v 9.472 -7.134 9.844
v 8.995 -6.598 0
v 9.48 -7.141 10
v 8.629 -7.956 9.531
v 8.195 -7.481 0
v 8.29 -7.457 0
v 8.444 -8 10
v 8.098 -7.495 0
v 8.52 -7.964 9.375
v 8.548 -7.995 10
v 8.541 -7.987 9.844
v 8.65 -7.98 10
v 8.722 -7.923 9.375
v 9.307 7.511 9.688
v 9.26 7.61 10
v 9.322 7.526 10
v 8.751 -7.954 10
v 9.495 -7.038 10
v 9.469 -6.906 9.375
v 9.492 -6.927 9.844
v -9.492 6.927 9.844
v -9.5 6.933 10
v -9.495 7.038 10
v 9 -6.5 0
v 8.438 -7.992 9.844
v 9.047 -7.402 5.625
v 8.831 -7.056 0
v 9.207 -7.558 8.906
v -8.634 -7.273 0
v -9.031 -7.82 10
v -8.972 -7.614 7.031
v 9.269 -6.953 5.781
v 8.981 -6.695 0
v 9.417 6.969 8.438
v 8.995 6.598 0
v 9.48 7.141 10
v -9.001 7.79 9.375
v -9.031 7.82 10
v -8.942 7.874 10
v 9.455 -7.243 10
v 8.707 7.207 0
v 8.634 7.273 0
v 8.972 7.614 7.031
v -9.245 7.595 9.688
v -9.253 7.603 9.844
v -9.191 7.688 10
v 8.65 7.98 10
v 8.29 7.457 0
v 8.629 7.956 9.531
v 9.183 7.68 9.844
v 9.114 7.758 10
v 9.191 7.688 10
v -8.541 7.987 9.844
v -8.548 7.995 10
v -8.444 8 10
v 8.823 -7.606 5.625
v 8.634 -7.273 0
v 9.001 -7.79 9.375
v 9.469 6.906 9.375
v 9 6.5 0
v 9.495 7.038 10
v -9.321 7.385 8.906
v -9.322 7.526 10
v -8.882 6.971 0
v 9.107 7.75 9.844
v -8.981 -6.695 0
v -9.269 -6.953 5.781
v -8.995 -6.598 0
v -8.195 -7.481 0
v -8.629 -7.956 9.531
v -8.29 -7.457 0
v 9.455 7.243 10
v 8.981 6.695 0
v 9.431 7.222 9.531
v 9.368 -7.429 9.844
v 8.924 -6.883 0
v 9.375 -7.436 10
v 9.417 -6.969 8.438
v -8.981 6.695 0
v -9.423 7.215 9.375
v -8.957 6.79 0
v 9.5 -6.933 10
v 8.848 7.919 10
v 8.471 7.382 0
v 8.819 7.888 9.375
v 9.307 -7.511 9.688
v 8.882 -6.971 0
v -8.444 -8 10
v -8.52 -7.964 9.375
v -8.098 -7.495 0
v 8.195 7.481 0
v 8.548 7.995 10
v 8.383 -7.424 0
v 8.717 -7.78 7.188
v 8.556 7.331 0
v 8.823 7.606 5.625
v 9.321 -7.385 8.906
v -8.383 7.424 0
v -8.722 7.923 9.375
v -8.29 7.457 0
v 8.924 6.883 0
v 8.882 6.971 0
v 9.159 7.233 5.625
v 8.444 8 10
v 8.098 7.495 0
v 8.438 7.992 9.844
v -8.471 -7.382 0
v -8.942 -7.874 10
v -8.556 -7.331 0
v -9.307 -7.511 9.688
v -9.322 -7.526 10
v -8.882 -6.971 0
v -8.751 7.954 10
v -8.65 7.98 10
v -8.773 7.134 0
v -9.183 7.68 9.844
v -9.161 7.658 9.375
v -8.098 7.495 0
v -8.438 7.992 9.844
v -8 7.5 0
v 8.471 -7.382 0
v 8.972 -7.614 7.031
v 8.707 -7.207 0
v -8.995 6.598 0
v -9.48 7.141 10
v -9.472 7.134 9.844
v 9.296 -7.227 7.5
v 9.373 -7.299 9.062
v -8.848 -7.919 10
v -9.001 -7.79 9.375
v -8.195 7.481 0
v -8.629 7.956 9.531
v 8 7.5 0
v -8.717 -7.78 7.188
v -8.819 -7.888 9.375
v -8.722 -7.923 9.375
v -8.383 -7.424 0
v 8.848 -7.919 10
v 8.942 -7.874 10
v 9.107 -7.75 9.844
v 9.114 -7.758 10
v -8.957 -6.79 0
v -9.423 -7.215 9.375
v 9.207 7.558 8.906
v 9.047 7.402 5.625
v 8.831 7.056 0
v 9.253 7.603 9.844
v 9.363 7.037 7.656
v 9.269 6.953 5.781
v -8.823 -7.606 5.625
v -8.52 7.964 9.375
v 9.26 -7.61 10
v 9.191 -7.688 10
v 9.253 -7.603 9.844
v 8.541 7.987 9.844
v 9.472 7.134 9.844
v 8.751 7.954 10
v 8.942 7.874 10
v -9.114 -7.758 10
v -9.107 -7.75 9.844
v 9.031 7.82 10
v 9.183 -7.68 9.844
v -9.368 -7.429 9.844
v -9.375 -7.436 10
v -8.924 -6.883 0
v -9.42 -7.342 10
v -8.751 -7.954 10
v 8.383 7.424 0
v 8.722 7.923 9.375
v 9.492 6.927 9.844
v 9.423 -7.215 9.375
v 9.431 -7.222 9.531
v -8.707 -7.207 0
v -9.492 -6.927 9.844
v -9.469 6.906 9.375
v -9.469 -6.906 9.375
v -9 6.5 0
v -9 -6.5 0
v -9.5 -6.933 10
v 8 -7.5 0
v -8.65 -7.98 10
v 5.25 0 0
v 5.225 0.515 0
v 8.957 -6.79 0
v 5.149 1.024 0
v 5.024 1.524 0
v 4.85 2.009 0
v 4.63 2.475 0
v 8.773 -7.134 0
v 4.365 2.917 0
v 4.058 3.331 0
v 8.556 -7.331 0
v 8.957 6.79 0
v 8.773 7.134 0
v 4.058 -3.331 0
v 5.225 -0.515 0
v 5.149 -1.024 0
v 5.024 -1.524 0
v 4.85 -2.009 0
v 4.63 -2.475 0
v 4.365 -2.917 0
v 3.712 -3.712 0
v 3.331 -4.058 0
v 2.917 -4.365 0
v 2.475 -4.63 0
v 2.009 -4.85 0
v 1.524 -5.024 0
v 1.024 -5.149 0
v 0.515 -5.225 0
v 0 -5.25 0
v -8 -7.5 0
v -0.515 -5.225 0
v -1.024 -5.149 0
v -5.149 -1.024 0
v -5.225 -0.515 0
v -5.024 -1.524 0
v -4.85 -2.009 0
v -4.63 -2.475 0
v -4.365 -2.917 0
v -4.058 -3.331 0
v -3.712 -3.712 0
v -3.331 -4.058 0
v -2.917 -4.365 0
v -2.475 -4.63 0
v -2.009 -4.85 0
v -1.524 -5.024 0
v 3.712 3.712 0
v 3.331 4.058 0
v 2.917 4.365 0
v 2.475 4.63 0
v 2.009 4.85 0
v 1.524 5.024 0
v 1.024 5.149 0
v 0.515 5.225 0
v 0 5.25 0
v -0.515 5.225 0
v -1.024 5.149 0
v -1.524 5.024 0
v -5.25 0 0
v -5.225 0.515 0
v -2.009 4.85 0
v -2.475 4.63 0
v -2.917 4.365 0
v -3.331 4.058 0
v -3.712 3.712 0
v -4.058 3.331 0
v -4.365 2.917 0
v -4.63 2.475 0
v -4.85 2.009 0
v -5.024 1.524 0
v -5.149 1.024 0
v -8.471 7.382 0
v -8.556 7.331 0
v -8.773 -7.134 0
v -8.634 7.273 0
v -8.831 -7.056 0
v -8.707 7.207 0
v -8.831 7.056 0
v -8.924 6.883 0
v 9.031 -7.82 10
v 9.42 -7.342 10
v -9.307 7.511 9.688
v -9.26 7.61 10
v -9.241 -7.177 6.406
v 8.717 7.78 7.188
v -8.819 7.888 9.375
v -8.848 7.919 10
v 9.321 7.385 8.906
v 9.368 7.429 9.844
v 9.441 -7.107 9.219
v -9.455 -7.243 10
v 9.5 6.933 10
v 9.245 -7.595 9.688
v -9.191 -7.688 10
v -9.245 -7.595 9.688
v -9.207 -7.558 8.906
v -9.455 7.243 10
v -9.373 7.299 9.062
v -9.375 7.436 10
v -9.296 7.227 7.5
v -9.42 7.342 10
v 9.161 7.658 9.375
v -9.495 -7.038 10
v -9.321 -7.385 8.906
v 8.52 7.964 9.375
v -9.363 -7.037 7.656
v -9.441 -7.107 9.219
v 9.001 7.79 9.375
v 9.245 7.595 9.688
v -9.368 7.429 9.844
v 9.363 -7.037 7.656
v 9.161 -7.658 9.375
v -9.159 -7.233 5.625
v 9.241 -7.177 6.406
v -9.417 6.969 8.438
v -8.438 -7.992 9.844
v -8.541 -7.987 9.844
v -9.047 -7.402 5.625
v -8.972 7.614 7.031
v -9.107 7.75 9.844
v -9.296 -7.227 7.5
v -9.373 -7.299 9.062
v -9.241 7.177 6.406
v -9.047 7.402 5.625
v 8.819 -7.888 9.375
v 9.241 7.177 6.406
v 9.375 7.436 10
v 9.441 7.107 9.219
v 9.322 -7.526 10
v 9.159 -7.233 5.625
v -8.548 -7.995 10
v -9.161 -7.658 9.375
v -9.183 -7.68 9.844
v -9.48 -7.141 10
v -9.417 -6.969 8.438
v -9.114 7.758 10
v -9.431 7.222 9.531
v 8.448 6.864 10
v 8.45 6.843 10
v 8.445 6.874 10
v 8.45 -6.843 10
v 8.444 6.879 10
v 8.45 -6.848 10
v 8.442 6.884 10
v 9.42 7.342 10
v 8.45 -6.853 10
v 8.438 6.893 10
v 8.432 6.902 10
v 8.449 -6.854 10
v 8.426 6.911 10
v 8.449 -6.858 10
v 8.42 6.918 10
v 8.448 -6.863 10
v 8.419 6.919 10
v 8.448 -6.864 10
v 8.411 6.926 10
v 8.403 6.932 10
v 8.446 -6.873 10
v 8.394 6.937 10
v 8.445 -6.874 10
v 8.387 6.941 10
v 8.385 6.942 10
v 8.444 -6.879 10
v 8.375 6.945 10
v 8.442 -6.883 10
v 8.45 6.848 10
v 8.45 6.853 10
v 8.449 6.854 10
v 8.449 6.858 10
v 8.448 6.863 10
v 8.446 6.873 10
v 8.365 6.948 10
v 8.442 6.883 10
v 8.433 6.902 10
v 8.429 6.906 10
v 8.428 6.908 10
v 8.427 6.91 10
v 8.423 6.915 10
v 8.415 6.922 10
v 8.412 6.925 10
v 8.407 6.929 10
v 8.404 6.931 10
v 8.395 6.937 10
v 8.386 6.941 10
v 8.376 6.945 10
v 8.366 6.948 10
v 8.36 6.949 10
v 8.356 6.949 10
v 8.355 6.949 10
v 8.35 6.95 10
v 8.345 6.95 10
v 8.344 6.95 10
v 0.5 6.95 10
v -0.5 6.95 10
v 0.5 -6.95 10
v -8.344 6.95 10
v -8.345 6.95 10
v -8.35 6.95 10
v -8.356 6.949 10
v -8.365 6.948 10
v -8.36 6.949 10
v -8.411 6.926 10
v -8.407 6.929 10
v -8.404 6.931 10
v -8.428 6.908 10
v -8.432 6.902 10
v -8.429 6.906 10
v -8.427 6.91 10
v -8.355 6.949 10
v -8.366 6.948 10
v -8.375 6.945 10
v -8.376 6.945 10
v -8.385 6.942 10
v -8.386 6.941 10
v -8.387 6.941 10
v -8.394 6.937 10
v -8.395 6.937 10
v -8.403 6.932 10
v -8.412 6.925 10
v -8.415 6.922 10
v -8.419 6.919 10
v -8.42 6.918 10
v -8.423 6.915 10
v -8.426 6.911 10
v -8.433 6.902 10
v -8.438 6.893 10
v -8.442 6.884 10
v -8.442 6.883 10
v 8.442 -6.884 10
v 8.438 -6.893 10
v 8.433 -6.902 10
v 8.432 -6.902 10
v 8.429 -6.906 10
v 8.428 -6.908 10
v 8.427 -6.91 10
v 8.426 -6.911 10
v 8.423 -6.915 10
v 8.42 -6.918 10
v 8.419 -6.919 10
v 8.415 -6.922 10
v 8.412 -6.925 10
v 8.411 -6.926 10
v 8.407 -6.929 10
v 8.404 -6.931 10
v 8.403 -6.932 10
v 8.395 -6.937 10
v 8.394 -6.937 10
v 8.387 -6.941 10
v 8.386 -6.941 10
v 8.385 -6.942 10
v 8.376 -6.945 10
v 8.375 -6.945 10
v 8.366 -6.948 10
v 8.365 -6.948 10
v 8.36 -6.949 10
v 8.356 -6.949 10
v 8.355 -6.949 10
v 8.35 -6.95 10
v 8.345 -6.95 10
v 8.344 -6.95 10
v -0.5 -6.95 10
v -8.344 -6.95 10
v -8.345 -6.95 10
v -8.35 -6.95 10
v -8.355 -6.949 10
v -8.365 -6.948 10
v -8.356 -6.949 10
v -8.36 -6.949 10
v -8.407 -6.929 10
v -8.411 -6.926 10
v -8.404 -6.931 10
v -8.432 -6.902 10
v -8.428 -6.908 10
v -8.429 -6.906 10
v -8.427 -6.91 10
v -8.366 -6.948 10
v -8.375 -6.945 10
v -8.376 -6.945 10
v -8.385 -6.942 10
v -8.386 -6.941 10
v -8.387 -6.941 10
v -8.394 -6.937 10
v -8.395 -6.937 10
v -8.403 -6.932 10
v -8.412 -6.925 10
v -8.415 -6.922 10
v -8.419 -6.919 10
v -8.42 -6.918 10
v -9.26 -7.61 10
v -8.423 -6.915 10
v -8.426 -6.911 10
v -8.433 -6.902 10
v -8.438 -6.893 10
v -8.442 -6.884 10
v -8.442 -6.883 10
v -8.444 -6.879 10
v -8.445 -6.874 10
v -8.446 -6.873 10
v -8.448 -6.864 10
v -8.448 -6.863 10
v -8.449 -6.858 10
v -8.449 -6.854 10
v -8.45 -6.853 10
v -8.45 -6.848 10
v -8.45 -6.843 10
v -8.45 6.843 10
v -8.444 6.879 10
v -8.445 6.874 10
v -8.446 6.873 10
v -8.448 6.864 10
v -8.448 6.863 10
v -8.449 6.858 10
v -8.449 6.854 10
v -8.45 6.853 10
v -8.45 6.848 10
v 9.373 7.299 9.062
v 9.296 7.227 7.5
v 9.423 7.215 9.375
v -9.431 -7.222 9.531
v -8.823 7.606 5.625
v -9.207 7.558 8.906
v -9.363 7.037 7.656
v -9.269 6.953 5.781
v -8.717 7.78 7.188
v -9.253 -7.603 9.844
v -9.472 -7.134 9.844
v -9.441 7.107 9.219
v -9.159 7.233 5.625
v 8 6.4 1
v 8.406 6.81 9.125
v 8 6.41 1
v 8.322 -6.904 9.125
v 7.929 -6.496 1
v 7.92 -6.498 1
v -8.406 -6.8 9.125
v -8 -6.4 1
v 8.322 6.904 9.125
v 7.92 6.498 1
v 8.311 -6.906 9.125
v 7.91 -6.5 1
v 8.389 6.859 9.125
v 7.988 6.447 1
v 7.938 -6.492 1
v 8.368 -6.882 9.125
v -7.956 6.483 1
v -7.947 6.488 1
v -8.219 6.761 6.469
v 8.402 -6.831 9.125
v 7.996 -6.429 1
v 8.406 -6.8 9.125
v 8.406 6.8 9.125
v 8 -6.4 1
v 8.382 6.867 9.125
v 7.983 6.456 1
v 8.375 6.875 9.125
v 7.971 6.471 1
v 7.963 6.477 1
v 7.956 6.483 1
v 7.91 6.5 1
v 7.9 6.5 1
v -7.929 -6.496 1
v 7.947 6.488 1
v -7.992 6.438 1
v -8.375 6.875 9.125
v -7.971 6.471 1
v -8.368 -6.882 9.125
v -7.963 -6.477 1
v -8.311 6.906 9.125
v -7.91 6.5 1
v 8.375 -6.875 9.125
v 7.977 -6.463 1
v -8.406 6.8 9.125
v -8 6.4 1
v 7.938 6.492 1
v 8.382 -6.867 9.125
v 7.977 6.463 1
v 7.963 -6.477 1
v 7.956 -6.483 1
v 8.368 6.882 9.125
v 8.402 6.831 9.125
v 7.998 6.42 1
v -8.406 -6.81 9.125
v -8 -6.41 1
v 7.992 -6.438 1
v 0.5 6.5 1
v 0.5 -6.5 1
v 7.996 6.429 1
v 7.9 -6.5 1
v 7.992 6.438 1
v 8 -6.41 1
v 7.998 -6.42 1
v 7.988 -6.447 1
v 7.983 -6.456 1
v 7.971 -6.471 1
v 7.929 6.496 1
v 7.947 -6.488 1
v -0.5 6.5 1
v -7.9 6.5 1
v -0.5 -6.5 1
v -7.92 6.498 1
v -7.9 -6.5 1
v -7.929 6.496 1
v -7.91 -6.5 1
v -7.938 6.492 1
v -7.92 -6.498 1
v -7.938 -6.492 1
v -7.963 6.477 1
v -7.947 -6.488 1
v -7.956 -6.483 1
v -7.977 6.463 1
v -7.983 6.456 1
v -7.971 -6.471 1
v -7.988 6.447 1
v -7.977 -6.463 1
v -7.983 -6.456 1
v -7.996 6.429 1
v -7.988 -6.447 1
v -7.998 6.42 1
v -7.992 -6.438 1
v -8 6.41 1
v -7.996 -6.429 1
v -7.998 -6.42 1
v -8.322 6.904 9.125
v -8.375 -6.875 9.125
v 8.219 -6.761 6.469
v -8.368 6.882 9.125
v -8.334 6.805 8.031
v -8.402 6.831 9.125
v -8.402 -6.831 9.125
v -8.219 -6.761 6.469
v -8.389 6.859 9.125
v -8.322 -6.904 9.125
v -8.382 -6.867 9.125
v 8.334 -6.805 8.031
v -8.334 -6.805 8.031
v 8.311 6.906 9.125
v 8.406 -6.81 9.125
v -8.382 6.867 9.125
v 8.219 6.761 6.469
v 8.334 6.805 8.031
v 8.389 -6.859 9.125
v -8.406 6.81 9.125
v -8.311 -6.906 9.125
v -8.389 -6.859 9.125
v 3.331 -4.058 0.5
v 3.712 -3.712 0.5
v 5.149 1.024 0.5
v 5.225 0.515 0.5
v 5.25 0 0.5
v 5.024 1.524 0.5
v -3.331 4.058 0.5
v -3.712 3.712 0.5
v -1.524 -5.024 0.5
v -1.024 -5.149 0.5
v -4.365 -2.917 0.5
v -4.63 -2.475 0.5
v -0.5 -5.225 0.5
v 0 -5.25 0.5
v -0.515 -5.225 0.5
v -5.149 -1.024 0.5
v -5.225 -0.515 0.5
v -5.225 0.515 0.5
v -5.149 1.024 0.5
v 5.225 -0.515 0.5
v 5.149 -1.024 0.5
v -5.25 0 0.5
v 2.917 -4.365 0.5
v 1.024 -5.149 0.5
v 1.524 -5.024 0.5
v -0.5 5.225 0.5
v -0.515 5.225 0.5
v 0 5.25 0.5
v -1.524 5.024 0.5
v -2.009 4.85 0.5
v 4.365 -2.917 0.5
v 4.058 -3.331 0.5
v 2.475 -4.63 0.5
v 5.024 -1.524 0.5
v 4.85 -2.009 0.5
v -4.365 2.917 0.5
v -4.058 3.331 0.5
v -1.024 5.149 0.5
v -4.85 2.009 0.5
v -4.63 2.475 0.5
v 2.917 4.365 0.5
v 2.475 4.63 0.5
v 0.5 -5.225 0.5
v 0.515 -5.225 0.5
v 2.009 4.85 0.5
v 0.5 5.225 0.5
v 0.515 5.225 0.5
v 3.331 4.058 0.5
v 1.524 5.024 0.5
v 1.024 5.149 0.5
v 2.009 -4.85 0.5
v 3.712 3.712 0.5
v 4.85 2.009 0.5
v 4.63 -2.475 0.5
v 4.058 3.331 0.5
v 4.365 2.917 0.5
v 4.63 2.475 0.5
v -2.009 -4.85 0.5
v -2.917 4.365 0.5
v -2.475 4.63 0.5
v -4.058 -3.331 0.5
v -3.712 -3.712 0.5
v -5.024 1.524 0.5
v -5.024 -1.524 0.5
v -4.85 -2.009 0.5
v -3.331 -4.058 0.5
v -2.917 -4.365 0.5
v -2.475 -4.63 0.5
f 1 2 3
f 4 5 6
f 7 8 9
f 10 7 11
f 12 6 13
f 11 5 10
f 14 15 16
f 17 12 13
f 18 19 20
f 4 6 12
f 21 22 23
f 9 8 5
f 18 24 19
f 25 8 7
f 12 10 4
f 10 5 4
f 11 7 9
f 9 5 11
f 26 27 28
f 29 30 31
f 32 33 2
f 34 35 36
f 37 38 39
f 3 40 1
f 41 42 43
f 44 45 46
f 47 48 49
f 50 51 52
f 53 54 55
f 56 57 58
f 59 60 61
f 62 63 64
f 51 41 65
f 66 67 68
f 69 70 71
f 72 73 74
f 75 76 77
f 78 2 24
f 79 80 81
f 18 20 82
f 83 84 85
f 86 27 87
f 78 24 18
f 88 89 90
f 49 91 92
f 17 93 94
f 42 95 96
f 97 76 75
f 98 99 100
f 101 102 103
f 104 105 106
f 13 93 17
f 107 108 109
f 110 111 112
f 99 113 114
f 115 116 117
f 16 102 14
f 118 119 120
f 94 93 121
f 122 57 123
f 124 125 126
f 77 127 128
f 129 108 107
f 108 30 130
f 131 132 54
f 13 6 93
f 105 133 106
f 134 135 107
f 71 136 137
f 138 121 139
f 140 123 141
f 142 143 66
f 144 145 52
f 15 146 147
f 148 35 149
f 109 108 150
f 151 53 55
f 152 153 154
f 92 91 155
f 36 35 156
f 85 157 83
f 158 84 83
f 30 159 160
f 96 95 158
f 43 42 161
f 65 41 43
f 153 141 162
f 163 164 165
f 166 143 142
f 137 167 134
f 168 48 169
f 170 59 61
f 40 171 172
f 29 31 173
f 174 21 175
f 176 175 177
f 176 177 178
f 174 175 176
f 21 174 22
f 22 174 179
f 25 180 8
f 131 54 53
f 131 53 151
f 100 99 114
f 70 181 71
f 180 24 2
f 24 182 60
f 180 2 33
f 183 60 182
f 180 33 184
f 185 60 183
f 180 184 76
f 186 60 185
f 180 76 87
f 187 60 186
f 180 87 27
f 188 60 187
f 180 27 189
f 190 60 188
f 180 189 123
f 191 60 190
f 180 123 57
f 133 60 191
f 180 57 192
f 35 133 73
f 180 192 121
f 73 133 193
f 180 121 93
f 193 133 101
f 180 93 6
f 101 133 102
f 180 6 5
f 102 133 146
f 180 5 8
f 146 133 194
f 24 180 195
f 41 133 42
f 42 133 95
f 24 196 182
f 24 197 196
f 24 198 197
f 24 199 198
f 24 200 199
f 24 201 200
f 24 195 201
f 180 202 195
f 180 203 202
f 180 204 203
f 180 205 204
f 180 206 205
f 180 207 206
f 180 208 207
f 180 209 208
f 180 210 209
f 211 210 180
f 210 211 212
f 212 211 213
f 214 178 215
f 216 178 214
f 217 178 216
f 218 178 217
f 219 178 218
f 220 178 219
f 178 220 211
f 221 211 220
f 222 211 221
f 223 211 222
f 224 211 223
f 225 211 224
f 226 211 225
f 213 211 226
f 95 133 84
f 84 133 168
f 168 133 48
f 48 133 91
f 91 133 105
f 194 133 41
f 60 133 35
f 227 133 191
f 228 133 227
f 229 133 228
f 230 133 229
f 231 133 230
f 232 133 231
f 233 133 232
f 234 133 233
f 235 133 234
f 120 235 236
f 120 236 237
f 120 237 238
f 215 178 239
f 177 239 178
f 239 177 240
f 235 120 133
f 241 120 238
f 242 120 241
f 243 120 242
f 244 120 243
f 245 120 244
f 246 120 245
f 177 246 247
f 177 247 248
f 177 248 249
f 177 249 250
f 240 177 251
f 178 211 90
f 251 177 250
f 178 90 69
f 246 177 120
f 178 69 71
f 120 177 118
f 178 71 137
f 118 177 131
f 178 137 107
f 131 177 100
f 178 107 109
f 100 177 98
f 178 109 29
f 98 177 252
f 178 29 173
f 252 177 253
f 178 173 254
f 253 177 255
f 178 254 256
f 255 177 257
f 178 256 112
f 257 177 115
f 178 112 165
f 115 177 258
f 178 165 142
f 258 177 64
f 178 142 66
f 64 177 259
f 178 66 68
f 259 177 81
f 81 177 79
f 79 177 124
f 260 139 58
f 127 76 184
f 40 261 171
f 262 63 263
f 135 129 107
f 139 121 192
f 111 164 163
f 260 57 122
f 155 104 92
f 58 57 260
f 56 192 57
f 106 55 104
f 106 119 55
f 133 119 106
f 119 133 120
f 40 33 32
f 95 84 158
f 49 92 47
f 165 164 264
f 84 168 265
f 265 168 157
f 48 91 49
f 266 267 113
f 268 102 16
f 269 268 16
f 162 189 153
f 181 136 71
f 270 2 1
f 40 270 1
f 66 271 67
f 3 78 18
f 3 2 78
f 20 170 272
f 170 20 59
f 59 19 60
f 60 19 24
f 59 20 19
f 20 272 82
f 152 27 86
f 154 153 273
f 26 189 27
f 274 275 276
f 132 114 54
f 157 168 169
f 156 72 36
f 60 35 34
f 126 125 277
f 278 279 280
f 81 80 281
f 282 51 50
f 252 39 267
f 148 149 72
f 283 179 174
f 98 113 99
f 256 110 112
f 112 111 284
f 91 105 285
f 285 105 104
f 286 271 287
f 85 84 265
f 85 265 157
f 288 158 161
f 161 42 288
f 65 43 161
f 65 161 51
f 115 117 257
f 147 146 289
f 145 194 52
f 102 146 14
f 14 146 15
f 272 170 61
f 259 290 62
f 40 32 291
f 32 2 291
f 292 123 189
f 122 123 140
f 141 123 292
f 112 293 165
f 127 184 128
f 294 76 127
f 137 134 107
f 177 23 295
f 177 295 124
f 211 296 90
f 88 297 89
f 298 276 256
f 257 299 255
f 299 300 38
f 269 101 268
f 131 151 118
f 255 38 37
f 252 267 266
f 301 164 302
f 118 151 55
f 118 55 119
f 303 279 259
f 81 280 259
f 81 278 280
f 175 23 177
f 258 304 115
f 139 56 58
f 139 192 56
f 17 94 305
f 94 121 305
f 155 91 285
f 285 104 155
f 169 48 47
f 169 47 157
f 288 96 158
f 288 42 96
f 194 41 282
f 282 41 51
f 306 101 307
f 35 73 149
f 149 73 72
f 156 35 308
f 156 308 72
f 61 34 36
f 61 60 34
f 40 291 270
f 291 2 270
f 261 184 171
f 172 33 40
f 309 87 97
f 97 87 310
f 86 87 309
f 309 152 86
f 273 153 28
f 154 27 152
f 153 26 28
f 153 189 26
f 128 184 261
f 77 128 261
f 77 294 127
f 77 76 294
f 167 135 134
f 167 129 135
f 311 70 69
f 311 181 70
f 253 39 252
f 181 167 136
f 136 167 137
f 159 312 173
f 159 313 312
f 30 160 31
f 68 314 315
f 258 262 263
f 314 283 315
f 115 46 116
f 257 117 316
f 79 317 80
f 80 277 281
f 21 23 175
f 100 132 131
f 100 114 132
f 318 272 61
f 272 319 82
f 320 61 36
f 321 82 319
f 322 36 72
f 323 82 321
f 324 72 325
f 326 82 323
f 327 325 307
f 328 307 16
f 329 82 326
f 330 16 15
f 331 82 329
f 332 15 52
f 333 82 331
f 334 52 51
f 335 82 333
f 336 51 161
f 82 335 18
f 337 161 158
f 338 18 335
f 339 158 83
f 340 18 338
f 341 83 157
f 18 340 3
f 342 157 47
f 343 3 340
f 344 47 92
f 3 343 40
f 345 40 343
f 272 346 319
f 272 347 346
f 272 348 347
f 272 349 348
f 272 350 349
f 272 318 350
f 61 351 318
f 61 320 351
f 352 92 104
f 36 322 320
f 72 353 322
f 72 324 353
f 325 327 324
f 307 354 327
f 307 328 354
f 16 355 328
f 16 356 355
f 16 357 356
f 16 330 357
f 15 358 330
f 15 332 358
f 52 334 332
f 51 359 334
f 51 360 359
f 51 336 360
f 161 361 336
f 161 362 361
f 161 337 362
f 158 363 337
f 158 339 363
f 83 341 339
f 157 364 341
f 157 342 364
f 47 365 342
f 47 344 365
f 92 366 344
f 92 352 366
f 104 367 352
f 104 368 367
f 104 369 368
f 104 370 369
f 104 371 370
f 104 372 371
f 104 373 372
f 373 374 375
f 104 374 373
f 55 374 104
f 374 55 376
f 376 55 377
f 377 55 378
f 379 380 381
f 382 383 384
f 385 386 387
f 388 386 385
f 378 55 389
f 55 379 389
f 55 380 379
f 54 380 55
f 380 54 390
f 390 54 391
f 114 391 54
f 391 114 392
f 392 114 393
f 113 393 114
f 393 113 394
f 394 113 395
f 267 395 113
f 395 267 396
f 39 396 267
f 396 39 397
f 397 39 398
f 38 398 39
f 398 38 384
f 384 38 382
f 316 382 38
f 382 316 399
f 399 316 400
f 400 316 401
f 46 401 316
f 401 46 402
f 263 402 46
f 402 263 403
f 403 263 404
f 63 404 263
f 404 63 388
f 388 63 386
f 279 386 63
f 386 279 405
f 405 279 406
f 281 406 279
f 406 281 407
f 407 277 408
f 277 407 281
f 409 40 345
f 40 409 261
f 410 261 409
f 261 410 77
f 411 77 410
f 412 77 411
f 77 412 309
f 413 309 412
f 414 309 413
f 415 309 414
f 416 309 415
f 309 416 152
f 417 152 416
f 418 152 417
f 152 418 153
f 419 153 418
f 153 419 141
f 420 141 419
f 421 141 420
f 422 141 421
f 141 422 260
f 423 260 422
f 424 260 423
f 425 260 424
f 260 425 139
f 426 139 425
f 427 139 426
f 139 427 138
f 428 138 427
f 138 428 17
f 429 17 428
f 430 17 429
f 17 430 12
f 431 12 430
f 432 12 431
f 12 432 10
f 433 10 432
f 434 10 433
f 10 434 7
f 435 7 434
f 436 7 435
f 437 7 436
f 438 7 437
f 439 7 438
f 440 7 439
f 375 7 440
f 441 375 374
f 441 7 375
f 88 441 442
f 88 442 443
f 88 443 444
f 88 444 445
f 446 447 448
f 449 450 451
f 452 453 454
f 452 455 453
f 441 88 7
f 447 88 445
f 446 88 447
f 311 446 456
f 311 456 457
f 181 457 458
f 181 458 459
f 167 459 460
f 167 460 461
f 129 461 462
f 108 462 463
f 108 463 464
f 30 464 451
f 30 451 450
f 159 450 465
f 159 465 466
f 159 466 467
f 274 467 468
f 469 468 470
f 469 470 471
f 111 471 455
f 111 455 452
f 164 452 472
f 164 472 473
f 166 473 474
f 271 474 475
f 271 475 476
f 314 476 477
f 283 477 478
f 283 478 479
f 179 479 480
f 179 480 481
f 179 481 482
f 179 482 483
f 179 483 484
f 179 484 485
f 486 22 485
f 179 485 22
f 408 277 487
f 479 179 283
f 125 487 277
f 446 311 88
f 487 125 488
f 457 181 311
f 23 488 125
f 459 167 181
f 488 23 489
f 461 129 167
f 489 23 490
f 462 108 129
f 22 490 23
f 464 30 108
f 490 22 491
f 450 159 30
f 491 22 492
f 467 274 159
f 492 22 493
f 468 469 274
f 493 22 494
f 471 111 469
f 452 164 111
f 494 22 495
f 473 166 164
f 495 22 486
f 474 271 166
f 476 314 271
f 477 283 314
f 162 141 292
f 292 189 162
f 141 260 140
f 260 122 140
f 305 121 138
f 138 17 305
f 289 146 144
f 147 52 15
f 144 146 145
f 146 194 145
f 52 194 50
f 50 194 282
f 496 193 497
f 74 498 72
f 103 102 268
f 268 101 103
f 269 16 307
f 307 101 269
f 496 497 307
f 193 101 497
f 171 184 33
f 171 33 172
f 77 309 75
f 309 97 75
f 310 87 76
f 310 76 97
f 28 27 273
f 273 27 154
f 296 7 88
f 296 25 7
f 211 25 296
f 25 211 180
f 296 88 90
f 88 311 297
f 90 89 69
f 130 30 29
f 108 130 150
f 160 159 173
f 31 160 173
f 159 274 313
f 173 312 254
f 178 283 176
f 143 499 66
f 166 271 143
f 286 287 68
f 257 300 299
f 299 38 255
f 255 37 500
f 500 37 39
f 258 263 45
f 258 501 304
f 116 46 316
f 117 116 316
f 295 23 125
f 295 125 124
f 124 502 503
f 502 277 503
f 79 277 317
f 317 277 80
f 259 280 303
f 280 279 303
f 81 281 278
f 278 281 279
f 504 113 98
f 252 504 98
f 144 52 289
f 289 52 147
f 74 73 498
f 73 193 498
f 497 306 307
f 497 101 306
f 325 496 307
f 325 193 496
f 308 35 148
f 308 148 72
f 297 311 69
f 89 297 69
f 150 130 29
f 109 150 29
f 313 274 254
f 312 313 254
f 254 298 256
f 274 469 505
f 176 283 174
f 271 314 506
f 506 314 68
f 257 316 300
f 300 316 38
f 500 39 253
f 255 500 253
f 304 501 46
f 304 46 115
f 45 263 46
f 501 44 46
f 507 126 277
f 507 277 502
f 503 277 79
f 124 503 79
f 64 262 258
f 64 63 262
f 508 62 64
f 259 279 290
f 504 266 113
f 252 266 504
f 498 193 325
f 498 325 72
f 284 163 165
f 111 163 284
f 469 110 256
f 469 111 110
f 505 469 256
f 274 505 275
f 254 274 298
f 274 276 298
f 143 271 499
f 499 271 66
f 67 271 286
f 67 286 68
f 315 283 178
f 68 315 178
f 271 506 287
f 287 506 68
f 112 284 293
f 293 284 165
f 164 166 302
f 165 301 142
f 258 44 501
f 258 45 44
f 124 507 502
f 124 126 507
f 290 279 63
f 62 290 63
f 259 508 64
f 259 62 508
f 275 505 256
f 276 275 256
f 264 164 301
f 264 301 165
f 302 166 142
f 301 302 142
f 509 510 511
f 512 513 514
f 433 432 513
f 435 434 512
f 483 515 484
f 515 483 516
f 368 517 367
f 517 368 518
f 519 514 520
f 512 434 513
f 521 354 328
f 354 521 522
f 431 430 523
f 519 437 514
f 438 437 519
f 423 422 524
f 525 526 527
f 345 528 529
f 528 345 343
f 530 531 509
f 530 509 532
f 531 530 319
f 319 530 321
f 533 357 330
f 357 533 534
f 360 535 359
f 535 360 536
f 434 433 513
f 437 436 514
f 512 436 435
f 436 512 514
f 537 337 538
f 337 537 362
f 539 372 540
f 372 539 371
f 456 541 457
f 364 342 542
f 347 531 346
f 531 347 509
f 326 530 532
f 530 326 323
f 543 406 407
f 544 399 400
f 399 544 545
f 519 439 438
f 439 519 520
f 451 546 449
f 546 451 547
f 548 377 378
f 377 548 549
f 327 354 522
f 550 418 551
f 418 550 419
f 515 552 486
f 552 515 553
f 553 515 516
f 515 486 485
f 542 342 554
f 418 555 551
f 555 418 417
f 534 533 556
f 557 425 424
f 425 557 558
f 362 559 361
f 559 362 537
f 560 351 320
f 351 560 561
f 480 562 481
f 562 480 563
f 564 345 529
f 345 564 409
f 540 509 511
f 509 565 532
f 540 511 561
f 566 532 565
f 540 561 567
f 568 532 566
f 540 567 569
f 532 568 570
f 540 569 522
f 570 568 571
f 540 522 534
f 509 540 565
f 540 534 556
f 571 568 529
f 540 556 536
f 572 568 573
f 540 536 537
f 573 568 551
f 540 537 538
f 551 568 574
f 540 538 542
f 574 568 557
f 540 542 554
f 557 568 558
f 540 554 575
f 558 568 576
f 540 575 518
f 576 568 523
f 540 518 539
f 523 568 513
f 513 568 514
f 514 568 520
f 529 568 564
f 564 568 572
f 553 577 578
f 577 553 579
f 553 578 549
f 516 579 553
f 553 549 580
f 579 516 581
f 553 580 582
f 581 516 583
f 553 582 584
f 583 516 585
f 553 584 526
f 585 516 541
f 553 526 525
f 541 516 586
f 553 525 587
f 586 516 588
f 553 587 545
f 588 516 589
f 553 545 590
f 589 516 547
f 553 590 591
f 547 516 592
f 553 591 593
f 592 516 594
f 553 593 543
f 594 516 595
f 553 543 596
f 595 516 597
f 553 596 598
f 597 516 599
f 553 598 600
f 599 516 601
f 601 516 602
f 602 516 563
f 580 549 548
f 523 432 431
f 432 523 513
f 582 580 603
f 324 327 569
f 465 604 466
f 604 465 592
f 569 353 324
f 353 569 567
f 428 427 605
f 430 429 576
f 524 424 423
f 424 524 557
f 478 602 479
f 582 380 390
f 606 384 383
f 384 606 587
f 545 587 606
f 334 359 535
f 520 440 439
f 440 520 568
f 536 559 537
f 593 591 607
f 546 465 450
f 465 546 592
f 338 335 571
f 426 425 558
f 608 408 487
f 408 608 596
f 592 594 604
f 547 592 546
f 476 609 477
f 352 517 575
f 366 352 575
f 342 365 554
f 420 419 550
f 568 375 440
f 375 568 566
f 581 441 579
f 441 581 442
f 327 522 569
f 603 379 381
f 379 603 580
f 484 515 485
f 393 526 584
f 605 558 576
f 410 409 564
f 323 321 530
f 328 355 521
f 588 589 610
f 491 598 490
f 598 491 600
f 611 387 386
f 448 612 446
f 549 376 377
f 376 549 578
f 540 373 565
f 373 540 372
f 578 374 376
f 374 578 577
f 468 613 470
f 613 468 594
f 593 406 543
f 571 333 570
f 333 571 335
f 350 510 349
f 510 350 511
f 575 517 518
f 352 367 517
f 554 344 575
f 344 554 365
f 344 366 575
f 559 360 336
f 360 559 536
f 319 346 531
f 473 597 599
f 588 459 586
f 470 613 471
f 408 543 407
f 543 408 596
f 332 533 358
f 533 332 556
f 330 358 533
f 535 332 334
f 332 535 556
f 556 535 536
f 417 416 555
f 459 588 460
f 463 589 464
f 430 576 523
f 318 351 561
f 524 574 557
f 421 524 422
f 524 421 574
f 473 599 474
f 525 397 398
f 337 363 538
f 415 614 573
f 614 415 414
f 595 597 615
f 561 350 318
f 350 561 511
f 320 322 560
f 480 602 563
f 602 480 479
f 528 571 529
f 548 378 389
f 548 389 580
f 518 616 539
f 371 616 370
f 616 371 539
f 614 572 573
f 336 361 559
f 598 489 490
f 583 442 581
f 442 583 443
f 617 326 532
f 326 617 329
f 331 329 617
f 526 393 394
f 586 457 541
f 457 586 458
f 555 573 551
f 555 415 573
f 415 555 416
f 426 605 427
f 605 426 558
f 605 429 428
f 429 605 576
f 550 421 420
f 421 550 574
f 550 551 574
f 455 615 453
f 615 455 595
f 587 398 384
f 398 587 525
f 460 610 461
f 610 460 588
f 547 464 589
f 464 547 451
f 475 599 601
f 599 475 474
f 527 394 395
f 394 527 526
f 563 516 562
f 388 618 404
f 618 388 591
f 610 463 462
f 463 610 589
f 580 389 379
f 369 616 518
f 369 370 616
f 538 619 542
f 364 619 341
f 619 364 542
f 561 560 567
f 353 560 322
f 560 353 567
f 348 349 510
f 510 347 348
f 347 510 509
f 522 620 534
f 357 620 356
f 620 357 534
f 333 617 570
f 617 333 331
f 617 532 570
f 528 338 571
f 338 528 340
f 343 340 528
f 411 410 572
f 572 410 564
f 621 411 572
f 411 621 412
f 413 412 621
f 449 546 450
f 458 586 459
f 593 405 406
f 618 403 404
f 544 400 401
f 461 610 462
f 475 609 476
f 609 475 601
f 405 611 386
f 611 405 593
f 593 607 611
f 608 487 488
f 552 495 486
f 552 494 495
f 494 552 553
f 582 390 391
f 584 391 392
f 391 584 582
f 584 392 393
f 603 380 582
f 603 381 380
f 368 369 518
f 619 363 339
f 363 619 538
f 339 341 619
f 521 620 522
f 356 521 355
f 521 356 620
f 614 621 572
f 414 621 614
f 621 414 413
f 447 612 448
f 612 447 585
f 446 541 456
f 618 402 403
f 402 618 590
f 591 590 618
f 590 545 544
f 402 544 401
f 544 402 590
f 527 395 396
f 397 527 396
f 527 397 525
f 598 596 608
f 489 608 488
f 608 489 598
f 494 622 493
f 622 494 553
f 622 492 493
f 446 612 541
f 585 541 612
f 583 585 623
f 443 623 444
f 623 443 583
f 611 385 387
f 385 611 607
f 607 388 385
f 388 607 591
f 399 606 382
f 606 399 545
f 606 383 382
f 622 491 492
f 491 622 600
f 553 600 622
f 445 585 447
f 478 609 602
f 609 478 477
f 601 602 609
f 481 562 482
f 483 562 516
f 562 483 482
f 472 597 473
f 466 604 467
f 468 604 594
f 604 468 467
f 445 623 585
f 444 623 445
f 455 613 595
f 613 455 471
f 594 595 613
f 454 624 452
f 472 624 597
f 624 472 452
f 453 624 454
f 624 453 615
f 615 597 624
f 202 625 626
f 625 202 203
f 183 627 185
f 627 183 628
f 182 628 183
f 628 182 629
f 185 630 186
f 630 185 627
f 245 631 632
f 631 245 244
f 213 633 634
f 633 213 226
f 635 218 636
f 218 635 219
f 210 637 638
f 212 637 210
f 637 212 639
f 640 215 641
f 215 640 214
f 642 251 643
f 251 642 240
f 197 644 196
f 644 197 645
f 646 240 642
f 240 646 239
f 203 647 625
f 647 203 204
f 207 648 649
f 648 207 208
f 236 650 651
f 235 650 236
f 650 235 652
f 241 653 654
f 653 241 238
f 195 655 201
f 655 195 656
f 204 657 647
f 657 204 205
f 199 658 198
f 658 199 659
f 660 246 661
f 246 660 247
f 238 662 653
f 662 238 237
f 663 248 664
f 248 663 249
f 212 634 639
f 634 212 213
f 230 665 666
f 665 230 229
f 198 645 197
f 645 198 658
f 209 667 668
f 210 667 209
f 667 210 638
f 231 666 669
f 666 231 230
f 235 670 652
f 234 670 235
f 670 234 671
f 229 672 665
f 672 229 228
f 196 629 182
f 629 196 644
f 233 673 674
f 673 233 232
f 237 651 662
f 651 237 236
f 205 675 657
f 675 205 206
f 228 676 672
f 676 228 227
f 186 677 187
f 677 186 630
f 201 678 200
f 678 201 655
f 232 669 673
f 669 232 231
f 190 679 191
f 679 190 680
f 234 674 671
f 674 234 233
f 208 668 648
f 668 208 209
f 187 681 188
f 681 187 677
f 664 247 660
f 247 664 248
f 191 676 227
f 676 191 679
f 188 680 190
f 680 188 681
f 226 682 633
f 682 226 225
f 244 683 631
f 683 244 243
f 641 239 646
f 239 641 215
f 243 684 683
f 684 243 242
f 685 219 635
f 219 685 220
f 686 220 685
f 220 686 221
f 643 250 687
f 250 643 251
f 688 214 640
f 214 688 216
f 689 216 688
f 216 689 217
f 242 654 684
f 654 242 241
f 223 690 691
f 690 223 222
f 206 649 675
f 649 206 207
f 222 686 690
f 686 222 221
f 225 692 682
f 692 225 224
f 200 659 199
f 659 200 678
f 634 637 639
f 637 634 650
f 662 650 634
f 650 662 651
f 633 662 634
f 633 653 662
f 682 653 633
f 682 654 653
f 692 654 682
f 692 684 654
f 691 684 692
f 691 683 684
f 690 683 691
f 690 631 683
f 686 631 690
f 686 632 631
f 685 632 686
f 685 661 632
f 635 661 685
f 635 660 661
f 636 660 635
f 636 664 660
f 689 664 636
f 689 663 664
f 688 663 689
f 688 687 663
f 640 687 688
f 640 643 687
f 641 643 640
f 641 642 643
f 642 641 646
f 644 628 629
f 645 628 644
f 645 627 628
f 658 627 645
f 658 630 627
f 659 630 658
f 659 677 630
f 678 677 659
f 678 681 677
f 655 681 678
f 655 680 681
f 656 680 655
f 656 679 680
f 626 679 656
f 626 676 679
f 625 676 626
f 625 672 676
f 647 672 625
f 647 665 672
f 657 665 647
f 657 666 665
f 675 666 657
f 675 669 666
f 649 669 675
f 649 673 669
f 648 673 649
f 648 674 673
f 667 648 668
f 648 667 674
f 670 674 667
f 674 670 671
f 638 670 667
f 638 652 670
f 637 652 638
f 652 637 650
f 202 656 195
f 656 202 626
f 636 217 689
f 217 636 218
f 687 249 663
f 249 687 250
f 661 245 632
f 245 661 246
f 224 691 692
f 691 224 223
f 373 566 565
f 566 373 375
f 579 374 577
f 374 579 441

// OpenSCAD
// --- Parameters ---
$fn = 64;           // Increased resolution for smooth curves

base_x = 18;       // Base width (mm)
base_y = 15;       // Base depth (mm)
height = 10;       // Total height (mm)
flare = 0.5;       // Flare per side (mm)
wall_thick = 1.0;  // Outer wall and divider thickness (mm)
r_corner = 1.0;    // Outer corner radius (mm)
dividers = 1;      // Number of interior dividing walls

// Magnet Recess Parameters
magnet_dia = 10.5; // Diameter (10.5mm for 10mm magnet tolerance)
magnet_h = 0.5;    // Recess depth (mm)

// --- Derived Calculations ---
top_x = base_x + (flare * 2);
top_y = base_y + (flare * 2);

scale_x = top_x / base_x;
scale_y = top_y / base_y;

// --- Modules ---

// 2D base profile with rounded corners
module rounded_rect(w, h, r) {
    offset(r = r)
        square([w - 2*r, h - 2*r], center = true);
}

// Solid flared pan body
module outer_pan_solid() {
    linear_extrude(height = height, scale = [scale_x, scale_y])
        rounded_rect(base_x, base_y, r_corner);
}

// Interior negative space to subtract
module inner_cavity() {
    in_base_x = base_x - (2 * wall_thick);
    in_base_y = base_y - (2 * wall_thick);
    
    in_top_x = top_x - (2 * wall_thick);
    in_top_y = top_y - (2 * wall_thick);
    
    in_scale_x = in_top_x / in_base_x;
    in_scale_y = in_top_y / in_base_y;
    
    in_r_corner = max(0.1, r_corner - wall_thick);

    translate([0, 0, wall_thick])
        linear_extrude(height = height, scale = [in_scale_x, in_scale_y])
            rounded_rect(in_base_x, in_base_y, in_r_corner);
}

// Underside magnet recess cylinder
module magnet_recess() {
    // Offset slightly below Z=0 (-0.01) to prevent zero-thickness surface rendering glitches
    translate([0, 0, -0.01])
        cylinder(d = magnet_dia, h = magnet_h + 0.01);
}

// Internal divider wall(s) matching the flared profile
module divider_walls() {
    if (dividers > 0) {
        step = top_x / (dividers + 1);
        for (i = [1 : dividers]) {
            x_pos = -top_x/2 + i * step;
            // Center X and Y, but start Z directly at magnet_h
            translate([x_pos - wall_thick/2, -top_y/2, magnet_h])
                cube([wall_thick, top_y, height - magnet_h], center = false);        }
    }
}

module divided_pan() { 
    // --- Main Assembly ---
    difference() {
        outer_pan_solid();
        inner_cavity();
        magnet_recess(); // Subtracted from bottom center
    }

    // Intersect dividers with outer shell so they flare naturally along walls
    intersection() {
        outer_pan_solid();
        divider_walls();
    }
}

module pan_array(x_count, y_count) {
    spacing = 1;
    for (i = [0 : x_count - 1]) {
        for (j = [0 : y_count - 1]) {
            translate([i * (top_x + spacing), j * (top_y + spacing)])
                divided_pan();
        }
    }
}
pan_array(1,1);
